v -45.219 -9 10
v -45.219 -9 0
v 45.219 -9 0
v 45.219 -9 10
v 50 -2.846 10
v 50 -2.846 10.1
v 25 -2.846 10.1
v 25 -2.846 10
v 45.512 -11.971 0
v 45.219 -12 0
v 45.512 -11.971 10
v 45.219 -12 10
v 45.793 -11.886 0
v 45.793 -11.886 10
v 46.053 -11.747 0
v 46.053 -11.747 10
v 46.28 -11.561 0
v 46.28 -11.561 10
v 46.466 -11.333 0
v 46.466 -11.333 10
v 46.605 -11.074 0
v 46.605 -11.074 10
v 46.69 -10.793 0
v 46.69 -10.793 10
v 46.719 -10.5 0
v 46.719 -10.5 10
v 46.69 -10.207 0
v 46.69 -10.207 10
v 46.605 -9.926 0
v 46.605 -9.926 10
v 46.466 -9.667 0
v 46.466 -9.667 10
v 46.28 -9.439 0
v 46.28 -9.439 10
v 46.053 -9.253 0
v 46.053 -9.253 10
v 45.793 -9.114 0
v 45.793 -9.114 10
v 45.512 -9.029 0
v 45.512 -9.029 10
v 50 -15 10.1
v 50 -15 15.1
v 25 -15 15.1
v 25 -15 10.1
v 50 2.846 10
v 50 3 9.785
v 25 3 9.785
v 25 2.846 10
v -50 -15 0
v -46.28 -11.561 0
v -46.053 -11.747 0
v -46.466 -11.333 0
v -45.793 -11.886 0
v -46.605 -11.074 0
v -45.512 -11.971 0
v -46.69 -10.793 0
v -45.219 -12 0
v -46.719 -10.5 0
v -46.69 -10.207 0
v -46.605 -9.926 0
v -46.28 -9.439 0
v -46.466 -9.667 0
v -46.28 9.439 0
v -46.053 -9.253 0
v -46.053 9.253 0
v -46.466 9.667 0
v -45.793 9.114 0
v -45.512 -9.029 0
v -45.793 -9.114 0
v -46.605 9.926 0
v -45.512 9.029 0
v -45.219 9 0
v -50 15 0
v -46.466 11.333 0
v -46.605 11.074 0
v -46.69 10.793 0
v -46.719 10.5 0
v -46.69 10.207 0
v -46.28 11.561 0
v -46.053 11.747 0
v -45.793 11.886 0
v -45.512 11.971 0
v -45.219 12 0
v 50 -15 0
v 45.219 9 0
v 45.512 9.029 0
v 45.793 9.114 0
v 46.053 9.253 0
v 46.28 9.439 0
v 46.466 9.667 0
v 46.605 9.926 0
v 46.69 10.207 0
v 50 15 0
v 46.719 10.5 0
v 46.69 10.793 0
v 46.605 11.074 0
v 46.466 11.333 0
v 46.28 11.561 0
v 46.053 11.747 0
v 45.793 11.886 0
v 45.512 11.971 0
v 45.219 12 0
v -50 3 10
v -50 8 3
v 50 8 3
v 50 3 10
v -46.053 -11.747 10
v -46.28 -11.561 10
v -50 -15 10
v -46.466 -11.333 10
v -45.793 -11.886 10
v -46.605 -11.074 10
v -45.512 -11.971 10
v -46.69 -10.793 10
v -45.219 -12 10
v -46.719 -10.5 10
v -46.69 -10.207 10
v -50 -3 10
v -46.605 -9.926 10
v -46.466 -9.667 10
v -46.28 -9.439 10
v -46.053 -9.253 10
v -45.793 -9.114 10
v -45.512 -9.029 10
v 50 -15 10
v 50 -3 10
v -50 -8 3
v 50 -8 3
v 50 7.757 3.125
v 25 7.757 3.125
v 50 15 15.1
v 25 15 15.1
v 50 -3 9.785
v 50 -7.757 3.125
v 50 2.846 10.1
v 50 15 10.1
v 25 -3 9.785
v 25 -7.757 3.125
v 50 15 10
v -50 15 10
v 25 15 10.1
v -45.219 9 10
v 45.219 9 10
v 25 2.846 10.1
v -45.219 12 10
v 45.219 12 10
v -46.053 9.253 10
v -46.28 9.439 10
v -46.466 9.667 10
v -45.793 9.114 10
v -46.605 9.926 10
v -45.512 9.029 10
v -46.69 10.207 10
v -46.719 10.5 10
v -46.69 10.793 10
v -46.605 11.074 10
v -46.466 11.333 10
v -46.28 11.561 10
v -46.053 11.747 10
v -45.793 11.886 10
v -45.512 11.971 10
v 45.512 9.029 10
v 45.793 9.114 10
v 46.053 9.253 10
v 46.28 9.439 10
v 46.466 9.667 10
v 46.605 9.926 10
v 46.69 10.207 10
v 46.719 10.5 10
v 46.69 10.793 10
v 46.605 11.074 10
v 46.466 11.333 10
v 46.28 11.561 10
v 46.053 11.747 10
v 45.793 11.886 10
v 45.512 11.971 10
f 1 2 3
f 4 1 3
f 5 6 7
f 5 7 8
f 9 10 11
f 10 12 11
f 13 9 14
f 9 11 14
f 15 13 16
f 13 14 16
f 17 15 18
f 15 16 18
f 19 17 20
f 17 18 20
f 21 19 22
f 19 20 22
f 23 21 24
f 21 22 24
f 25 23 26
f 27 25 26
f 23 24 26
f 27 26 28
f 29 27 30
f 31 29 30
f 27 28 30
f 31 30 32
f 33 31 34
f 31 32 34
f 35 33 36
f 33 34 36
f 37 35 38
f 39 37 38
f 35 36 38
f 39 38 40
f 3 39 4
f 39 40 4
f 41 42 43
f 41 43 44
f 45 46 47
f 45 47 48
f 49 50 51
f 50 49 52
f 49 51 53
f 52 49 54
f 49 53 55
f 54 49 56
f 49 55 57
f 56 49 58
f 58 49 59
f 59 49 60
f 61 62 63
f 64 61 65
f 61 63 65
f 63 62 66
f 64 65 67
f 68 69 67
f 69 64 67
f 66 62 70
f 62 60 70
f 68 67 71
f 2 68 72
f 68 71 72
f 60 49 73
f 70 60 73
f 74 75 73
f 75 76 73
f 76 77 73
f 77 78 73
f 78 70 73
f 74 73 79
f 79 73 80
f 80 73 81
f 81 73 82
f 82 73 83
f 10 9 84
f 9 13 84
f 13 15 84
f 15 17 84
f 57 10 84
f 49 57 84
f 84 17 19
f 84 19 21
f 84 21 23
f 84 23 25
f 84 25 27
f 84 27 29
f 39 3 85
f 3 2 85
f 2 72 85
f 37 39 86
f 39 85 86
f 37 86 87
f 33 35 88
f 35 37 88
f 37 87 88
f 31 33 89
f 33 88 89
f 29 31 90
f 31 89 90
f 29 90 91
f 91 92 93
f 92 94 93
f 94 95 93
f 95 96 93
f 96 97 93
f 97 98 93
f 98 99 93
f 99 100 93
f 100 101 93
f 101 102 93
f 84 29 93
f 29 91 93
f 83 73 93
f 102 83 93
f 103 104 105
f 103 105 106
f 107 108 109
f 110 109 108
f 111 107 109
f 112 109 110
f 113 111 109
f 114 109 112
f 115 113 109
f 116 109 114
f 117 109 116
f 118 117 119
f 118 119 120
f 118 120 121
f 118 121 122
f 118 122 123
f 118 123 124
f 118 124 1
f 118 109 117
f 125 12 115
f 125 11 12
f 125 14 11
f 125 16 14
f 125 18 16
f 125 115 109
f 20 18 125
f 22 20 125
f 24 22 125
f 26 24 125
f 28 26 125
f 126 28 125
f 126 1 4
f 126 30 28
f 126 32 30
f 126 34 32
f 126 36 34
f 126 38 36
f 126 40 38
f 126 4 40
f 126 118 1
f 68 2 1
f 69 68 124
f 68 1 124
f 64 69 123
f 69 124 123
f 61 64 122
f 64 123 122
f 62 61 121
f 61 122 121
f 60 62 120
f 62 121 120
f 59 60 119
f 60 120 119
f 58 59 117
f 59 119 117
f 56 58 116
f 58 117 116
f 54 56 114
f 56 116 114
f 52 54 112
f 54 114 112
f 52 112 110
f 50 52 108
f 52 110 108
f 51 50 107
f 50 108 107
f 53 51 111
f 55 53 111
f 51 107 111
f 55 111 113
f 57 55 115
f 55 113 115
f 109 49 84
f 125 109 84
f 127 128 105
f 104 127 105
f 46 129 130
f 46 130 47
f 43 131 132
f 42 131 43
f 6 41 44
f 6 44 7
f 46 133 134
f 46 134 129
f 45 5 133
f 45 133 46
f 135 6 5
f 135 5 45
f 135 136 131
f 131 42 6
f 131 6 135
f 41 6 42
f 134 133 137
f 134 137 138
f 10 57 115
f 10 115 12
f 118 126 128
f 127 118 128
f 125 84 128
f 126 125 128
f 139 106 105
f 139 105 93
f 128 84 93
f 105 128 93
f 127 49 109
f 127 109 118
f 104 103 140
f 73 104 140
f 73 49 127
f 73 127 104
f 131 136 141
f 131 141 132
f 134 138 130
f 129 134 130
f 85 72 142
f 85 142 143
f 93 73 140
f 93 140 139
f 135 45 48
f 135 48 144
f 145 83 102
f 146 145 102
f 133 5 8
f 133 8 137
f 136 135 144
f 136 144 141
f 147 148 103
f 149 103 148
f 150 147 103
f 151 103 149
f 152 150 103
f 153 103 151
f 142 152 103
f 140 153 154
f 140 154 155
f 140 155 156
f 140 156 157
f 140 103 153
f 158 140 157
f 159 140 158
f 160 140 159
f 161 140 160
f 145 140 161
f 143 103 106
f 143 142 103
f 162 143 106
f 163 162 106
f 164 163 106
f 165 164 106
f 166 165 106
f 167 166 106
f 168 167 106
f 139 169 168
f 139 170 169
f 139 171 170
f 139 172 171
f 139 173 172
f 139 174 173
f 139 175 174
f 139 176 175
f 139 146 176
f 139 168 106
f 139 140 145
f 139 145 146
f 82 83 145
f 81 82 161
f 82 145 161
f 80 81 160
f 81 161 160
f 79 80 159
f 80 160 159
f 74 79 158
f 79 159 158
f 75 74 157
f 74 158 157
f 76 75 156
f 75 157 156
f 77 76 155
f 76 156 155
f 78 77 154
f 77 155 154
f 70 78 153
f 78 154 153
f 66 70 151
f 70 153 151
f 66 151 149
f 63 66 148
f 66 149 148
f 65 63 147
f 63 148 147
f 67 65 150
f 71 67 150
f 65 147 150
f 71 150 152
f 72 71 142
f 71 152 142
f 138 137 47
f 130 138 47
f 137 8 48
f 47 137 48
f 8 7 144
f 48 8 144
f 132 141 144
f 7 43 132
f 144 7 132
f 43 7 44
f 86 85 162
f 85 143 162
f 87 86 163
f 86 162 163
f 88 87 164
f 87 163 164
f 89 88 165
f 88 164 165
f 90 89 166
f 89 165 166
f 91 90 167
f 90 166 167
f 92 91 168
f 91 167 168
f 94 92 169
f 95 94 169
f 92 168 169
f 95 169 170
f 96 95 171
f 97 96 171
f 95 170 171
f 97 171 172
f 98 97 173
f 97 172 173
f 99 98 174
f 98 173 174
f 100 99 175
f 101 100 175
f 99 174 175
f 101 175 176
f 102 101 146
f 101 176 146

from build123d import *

# Parameters (mm, degrees)
F0_W     = 100
F0_H     = 9
F0_W_2   = 90.4385894537
F0_H_2   = 3
F1_DEPTH = 10
F0_H_3   = 6
F2_DEPTH = 3
F3_D     = 3
F3_DEPTH = 20
F3_TIP   = 0.9012909285
F5_DEPTH = 100.001
F6_DEPTH = 25


with BuildPart() as f1:
    # F0 (on Top) → F1 (new body)
    with BuildSketch(Plane.XY):
        with Locations((0, 10.5)):
            Rectangle(F0_W, F0_H)
        with Locations((0, 10.5)):
            Rectangle(F0_W_2, F0_H_2, mode=Mode.SUBTRACT)
        with Locations((0, 4.5)):
            Rectangle(F0_W, F0_H_2)
    extrude(amount=F1_DEPTH)



with BuildPart() as f1b:
    # F0 (on Top) → F1, piece 2 (new body)
    with BuildSketch(Plane.XY):
        with Locations((0, -10.5)):
            Rectangle(F0_W, F0_H)
        with Locations((0, -10.5)):
            Rectangle(F0_W_2, F0_H_2, mode=Mode.SUBTRACT)
        with Locations((0, -4.5)):
            Rectangle(F0_W, F0_H_2)
    extrude(amount=F1_DEPTH)


with BuildPart() as f1_1:
    add(f1.part)

    add(f1b.part)  # F2 merges F1b
    # F0 (on Top) → F2 (join)
    with BuildSketch(Plane.XY):
        Rectangle(F0_W, F0_H_3)
    extrude(amount=F2_DEPTH)

    # F3
    with Locations(Plane(origin=(0, 0, 0), x_dir=(1, 0, 0), z_dir=(0, 0, -1))):
        with Locations((-45.2192947268, 10.5), (45.2192947268, 10.5), (-45.2192947268, -10.5), (45.2192947268, -10.5)):
            Hole(F3_D / 2, depth=F3_DEPTH)
            with Locations((0, 0, -(F3_DEPTH + F3_TIP / 2))):  # 118° drill point
                Cone(0, F3_D / 2, F3_TIP, mode=Mode.SUBTRACT)

    # F4 (on face) → F5 (cut, through all)
    with BuildSketch(Plane.YZ.offset(50)):
        Polygon((-3, 3), (-3, 3.125), (-7.7571013345, 3.125), (-3, 9.7849418683), (-3, 10), (-8, 3), align=None)
        Polygon((3, 3.125), (3, 3), (8, 3), (3, 10), (3, 9.7849418683), (7.7571013345, 3.125), align=None)
        Polygon((-7.7571013345, 3.125), (-3, 3.125), (-3, 9.7849418683), align=None)
        Polygon((-3, 3.125), (3, 3.125), (3, 9.7849418683), (2.8463870488, 10), (2.8463870488, 10.1), (15, 10.1), (15, 15.1), (-15, 15.1), (-15, 10.1), (-2.8463870488, 10.1), (-2.8463870488, 10), (-3, 9.7849418683), align=None)
        Polygon((3, 9.7849418683), (3, 3.125), (7.7571013345, 3.125), align=None)
    extrude(amount=-F5_DEPTH, mode=Mode.SUBTRACT)


with BuildPart() as f6:
    # F4 (on face) → F6 (new body)
    with BuildSketch(Plane.YZ.offset(50)):
        Polygon((-3, 3.125), (3, 3.125), (3, 9.7849418683), (2.8463870488, 10), (2.8463870488, 10.1), (15, 10.1), (15, 15.1), (-15, 15.1), (-15, 10.1), (-2.8463870488, 10.1), (-2.8463870488, 10), (-3, 9.7849418683), align=None)
        Polygon((-7.7571013345, 3.125), (-3, 3.125), (-3, 9.7849418683), align=None)
        Polygon((3, 9.7849418683), (3, 3.125), (7.7571013345, 3.125), align=None)
    extrude(amount=-F6_DEPTH)


solid = Compound([f1_1.part, f6.part])
